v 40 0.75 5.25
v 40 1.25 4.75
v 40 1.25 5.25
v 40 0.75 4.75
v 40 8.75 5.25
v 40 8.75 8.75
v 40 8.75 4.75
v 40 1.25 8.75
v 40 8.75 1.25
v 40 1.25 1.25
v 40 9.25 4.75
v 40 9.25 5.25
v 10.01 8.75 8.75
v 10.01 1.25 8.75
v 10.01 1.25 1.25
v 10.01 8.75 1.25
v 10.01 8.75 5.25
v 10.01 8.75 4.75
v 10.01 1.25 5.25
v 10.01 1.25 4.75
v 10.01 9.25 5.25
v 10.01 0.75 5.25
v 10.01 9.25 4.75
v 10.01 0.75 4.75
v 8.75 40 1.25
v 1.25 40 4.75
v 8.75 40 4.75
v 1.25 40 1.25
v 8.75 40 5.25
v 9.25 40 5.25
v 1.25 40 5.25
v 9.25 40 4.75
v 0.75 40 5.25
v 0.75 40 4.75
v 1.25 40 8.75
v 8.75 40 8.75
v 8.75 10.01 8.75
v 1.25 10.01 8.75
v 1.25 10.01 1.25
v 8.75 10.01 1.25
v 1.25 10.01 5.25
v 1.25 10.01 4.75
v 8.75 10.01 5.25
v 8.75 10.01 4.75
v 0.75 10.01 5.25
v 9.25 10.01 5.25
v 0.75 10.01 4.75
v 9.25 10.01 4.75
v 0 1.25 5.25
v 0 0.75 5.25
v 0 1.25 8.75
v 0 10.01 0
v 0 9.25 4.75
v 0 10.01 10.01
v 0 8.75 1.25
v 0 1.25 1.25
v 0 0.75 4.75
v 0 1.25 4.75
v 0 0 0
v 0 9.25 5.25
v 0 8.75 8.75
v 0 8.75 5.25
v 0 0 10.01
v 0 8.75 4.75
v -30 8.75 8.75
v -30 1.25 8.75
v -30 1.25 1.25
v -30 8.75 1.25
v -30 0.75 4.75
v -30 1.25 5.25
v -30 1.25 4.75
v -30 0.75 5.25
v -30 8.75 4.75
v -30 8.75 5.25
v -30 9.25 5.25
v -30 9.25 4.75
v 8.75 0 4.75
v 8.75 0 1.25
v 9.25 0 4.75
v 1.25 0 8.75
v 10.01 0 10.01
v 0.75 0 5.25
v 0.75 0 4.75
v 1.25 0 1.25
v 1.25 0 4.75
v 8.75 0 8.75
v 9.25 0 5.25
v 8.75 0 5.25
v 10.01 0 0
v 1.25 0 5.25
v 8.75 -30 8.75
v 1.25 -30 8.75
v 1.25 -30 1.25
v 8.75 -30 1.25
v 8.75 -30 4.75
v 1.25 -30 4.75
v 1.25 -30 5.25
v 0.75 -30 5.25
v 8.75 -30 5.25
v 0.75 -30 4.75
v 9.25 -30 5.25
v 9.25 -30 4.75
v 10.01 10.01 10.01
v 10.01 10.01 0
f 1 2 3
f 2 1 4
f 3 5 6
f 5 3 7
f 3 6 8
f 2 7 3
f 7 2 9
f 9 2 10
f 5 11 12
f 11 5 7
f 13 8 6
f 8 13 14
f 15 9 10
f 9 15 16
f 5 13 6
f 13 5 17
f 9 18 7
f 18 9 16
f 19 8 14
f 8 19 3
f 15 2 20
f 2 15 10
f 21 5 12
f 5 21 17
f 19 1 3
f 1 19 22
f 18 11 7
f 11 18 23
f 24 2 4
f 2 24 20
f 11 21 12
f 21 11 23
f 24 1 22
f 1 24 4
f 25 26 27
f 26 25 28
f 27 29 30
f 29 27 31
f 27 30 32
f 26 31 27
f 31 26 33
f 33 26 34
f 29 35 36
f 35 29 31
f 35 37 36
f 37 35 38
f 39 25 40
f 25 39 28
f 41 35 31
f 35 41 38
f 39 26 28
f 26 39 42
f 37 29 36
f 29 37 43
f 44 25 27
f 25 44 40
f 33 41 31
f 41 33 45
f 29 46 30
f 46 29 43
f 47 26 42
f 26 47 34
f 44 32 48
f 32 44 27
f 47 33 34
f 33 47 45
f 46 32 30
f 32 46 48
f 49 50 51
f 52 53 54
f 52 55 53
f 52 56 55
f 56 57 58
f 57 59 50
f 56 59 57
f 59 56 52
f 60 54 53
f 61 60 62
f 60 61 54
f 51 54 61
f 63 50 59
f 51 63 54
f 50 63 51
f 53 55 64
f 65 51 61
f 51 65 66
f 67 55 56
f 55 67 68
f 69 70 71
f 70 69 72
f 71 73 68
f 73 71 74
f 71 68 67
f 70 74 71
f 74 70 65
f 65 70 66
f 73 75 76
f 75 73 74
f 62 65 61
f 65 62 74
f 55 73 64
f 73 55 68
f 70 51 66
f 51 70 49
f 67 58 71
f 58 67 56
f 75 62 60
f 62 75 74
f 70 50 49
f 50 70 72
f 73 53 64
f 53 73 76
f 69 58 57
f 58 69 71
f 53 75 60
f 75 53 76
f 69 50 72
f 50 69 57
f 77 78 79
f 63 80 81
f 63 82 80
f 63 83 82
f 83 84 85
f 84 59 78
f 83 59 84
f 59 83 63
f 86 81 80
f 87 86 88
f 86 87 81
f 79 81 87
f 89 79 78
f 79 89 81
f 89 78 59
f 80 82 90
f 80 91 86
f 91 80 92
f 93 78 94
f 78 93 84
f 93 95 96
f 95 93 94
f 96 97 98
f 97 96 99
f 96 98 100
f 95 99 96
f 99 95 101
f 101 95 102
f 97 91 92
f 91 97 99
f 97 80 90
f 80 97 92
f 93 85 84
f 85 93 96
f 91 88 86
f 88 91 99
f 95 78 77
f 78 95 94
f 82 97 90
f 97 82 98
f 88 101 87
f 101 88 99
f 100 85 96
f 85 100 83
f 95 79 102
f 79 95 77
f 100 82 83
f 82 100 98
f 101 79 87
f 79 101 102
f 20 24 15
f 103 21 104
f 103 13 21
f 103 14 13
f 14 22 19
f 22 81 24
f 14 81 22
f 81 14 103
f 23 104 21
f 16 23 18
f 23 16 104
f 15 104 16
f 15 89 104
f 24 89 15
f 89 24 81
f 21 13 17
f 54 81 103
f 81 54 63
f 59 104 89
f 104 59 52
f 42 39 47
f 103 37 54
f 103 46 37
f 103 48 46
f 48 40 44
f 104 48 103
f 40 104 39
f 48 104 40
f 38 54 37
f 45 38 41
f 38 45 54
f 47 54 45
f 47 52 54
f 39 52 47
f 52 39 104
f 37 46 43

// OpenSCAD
// Set lenght of the legs in mm
lengte = 30;

// Set size of inner dimension in mm
binnenzijde = 7.5;

// Set size of outer dimension in mm
buitenzijde = 10;

// Set size of wall thickness in mm
wand = 1;

// Set height of break lines in mm
hulplijn = 0.5;

// Set variant
variant = 5; // [1:End Piece, 2:Extension, 3:Corner, 4:T, 5:Cross]

module poot(l, b, h)
{
	cube([l,b,b]);
	color("blue")translate([0,-h,b/2-h/2]) cube([l,b+h*2,0.5]);

}

color("red")cube(buitenzijde+0.01);
translate([buitenzijde,(buitenzijde-binnenzijde)/2,(buitenzijde-binnenzijde)/2])poot(lengte, binnenzijde, hulplijn);

if (variant > 2)
{
	translate([10 - (buitenzijde-binnenzijde)/2,buitenzijde,(buitenzijde-binnenzijde)/2])rotate([0,0,90])poot(lengte, binnenzijde, hulplijn);
}

if (variant == 2 || variant > 3)
{
	translate([-lengte,(buitenzijde-binnenzijde)/2,(buitenzijde-binnenzijde)/2])poot(lengte, binnenzijde, hulplijn);
}

if (variant == 5)
{
	translate([10 - (buitenzijde-binnenzijde)/2,-lengte,(buitenzijde-binnenzijde)/2])rotate([0,0,90])poot(lengte, binnenzijde, hulplijn);
}
